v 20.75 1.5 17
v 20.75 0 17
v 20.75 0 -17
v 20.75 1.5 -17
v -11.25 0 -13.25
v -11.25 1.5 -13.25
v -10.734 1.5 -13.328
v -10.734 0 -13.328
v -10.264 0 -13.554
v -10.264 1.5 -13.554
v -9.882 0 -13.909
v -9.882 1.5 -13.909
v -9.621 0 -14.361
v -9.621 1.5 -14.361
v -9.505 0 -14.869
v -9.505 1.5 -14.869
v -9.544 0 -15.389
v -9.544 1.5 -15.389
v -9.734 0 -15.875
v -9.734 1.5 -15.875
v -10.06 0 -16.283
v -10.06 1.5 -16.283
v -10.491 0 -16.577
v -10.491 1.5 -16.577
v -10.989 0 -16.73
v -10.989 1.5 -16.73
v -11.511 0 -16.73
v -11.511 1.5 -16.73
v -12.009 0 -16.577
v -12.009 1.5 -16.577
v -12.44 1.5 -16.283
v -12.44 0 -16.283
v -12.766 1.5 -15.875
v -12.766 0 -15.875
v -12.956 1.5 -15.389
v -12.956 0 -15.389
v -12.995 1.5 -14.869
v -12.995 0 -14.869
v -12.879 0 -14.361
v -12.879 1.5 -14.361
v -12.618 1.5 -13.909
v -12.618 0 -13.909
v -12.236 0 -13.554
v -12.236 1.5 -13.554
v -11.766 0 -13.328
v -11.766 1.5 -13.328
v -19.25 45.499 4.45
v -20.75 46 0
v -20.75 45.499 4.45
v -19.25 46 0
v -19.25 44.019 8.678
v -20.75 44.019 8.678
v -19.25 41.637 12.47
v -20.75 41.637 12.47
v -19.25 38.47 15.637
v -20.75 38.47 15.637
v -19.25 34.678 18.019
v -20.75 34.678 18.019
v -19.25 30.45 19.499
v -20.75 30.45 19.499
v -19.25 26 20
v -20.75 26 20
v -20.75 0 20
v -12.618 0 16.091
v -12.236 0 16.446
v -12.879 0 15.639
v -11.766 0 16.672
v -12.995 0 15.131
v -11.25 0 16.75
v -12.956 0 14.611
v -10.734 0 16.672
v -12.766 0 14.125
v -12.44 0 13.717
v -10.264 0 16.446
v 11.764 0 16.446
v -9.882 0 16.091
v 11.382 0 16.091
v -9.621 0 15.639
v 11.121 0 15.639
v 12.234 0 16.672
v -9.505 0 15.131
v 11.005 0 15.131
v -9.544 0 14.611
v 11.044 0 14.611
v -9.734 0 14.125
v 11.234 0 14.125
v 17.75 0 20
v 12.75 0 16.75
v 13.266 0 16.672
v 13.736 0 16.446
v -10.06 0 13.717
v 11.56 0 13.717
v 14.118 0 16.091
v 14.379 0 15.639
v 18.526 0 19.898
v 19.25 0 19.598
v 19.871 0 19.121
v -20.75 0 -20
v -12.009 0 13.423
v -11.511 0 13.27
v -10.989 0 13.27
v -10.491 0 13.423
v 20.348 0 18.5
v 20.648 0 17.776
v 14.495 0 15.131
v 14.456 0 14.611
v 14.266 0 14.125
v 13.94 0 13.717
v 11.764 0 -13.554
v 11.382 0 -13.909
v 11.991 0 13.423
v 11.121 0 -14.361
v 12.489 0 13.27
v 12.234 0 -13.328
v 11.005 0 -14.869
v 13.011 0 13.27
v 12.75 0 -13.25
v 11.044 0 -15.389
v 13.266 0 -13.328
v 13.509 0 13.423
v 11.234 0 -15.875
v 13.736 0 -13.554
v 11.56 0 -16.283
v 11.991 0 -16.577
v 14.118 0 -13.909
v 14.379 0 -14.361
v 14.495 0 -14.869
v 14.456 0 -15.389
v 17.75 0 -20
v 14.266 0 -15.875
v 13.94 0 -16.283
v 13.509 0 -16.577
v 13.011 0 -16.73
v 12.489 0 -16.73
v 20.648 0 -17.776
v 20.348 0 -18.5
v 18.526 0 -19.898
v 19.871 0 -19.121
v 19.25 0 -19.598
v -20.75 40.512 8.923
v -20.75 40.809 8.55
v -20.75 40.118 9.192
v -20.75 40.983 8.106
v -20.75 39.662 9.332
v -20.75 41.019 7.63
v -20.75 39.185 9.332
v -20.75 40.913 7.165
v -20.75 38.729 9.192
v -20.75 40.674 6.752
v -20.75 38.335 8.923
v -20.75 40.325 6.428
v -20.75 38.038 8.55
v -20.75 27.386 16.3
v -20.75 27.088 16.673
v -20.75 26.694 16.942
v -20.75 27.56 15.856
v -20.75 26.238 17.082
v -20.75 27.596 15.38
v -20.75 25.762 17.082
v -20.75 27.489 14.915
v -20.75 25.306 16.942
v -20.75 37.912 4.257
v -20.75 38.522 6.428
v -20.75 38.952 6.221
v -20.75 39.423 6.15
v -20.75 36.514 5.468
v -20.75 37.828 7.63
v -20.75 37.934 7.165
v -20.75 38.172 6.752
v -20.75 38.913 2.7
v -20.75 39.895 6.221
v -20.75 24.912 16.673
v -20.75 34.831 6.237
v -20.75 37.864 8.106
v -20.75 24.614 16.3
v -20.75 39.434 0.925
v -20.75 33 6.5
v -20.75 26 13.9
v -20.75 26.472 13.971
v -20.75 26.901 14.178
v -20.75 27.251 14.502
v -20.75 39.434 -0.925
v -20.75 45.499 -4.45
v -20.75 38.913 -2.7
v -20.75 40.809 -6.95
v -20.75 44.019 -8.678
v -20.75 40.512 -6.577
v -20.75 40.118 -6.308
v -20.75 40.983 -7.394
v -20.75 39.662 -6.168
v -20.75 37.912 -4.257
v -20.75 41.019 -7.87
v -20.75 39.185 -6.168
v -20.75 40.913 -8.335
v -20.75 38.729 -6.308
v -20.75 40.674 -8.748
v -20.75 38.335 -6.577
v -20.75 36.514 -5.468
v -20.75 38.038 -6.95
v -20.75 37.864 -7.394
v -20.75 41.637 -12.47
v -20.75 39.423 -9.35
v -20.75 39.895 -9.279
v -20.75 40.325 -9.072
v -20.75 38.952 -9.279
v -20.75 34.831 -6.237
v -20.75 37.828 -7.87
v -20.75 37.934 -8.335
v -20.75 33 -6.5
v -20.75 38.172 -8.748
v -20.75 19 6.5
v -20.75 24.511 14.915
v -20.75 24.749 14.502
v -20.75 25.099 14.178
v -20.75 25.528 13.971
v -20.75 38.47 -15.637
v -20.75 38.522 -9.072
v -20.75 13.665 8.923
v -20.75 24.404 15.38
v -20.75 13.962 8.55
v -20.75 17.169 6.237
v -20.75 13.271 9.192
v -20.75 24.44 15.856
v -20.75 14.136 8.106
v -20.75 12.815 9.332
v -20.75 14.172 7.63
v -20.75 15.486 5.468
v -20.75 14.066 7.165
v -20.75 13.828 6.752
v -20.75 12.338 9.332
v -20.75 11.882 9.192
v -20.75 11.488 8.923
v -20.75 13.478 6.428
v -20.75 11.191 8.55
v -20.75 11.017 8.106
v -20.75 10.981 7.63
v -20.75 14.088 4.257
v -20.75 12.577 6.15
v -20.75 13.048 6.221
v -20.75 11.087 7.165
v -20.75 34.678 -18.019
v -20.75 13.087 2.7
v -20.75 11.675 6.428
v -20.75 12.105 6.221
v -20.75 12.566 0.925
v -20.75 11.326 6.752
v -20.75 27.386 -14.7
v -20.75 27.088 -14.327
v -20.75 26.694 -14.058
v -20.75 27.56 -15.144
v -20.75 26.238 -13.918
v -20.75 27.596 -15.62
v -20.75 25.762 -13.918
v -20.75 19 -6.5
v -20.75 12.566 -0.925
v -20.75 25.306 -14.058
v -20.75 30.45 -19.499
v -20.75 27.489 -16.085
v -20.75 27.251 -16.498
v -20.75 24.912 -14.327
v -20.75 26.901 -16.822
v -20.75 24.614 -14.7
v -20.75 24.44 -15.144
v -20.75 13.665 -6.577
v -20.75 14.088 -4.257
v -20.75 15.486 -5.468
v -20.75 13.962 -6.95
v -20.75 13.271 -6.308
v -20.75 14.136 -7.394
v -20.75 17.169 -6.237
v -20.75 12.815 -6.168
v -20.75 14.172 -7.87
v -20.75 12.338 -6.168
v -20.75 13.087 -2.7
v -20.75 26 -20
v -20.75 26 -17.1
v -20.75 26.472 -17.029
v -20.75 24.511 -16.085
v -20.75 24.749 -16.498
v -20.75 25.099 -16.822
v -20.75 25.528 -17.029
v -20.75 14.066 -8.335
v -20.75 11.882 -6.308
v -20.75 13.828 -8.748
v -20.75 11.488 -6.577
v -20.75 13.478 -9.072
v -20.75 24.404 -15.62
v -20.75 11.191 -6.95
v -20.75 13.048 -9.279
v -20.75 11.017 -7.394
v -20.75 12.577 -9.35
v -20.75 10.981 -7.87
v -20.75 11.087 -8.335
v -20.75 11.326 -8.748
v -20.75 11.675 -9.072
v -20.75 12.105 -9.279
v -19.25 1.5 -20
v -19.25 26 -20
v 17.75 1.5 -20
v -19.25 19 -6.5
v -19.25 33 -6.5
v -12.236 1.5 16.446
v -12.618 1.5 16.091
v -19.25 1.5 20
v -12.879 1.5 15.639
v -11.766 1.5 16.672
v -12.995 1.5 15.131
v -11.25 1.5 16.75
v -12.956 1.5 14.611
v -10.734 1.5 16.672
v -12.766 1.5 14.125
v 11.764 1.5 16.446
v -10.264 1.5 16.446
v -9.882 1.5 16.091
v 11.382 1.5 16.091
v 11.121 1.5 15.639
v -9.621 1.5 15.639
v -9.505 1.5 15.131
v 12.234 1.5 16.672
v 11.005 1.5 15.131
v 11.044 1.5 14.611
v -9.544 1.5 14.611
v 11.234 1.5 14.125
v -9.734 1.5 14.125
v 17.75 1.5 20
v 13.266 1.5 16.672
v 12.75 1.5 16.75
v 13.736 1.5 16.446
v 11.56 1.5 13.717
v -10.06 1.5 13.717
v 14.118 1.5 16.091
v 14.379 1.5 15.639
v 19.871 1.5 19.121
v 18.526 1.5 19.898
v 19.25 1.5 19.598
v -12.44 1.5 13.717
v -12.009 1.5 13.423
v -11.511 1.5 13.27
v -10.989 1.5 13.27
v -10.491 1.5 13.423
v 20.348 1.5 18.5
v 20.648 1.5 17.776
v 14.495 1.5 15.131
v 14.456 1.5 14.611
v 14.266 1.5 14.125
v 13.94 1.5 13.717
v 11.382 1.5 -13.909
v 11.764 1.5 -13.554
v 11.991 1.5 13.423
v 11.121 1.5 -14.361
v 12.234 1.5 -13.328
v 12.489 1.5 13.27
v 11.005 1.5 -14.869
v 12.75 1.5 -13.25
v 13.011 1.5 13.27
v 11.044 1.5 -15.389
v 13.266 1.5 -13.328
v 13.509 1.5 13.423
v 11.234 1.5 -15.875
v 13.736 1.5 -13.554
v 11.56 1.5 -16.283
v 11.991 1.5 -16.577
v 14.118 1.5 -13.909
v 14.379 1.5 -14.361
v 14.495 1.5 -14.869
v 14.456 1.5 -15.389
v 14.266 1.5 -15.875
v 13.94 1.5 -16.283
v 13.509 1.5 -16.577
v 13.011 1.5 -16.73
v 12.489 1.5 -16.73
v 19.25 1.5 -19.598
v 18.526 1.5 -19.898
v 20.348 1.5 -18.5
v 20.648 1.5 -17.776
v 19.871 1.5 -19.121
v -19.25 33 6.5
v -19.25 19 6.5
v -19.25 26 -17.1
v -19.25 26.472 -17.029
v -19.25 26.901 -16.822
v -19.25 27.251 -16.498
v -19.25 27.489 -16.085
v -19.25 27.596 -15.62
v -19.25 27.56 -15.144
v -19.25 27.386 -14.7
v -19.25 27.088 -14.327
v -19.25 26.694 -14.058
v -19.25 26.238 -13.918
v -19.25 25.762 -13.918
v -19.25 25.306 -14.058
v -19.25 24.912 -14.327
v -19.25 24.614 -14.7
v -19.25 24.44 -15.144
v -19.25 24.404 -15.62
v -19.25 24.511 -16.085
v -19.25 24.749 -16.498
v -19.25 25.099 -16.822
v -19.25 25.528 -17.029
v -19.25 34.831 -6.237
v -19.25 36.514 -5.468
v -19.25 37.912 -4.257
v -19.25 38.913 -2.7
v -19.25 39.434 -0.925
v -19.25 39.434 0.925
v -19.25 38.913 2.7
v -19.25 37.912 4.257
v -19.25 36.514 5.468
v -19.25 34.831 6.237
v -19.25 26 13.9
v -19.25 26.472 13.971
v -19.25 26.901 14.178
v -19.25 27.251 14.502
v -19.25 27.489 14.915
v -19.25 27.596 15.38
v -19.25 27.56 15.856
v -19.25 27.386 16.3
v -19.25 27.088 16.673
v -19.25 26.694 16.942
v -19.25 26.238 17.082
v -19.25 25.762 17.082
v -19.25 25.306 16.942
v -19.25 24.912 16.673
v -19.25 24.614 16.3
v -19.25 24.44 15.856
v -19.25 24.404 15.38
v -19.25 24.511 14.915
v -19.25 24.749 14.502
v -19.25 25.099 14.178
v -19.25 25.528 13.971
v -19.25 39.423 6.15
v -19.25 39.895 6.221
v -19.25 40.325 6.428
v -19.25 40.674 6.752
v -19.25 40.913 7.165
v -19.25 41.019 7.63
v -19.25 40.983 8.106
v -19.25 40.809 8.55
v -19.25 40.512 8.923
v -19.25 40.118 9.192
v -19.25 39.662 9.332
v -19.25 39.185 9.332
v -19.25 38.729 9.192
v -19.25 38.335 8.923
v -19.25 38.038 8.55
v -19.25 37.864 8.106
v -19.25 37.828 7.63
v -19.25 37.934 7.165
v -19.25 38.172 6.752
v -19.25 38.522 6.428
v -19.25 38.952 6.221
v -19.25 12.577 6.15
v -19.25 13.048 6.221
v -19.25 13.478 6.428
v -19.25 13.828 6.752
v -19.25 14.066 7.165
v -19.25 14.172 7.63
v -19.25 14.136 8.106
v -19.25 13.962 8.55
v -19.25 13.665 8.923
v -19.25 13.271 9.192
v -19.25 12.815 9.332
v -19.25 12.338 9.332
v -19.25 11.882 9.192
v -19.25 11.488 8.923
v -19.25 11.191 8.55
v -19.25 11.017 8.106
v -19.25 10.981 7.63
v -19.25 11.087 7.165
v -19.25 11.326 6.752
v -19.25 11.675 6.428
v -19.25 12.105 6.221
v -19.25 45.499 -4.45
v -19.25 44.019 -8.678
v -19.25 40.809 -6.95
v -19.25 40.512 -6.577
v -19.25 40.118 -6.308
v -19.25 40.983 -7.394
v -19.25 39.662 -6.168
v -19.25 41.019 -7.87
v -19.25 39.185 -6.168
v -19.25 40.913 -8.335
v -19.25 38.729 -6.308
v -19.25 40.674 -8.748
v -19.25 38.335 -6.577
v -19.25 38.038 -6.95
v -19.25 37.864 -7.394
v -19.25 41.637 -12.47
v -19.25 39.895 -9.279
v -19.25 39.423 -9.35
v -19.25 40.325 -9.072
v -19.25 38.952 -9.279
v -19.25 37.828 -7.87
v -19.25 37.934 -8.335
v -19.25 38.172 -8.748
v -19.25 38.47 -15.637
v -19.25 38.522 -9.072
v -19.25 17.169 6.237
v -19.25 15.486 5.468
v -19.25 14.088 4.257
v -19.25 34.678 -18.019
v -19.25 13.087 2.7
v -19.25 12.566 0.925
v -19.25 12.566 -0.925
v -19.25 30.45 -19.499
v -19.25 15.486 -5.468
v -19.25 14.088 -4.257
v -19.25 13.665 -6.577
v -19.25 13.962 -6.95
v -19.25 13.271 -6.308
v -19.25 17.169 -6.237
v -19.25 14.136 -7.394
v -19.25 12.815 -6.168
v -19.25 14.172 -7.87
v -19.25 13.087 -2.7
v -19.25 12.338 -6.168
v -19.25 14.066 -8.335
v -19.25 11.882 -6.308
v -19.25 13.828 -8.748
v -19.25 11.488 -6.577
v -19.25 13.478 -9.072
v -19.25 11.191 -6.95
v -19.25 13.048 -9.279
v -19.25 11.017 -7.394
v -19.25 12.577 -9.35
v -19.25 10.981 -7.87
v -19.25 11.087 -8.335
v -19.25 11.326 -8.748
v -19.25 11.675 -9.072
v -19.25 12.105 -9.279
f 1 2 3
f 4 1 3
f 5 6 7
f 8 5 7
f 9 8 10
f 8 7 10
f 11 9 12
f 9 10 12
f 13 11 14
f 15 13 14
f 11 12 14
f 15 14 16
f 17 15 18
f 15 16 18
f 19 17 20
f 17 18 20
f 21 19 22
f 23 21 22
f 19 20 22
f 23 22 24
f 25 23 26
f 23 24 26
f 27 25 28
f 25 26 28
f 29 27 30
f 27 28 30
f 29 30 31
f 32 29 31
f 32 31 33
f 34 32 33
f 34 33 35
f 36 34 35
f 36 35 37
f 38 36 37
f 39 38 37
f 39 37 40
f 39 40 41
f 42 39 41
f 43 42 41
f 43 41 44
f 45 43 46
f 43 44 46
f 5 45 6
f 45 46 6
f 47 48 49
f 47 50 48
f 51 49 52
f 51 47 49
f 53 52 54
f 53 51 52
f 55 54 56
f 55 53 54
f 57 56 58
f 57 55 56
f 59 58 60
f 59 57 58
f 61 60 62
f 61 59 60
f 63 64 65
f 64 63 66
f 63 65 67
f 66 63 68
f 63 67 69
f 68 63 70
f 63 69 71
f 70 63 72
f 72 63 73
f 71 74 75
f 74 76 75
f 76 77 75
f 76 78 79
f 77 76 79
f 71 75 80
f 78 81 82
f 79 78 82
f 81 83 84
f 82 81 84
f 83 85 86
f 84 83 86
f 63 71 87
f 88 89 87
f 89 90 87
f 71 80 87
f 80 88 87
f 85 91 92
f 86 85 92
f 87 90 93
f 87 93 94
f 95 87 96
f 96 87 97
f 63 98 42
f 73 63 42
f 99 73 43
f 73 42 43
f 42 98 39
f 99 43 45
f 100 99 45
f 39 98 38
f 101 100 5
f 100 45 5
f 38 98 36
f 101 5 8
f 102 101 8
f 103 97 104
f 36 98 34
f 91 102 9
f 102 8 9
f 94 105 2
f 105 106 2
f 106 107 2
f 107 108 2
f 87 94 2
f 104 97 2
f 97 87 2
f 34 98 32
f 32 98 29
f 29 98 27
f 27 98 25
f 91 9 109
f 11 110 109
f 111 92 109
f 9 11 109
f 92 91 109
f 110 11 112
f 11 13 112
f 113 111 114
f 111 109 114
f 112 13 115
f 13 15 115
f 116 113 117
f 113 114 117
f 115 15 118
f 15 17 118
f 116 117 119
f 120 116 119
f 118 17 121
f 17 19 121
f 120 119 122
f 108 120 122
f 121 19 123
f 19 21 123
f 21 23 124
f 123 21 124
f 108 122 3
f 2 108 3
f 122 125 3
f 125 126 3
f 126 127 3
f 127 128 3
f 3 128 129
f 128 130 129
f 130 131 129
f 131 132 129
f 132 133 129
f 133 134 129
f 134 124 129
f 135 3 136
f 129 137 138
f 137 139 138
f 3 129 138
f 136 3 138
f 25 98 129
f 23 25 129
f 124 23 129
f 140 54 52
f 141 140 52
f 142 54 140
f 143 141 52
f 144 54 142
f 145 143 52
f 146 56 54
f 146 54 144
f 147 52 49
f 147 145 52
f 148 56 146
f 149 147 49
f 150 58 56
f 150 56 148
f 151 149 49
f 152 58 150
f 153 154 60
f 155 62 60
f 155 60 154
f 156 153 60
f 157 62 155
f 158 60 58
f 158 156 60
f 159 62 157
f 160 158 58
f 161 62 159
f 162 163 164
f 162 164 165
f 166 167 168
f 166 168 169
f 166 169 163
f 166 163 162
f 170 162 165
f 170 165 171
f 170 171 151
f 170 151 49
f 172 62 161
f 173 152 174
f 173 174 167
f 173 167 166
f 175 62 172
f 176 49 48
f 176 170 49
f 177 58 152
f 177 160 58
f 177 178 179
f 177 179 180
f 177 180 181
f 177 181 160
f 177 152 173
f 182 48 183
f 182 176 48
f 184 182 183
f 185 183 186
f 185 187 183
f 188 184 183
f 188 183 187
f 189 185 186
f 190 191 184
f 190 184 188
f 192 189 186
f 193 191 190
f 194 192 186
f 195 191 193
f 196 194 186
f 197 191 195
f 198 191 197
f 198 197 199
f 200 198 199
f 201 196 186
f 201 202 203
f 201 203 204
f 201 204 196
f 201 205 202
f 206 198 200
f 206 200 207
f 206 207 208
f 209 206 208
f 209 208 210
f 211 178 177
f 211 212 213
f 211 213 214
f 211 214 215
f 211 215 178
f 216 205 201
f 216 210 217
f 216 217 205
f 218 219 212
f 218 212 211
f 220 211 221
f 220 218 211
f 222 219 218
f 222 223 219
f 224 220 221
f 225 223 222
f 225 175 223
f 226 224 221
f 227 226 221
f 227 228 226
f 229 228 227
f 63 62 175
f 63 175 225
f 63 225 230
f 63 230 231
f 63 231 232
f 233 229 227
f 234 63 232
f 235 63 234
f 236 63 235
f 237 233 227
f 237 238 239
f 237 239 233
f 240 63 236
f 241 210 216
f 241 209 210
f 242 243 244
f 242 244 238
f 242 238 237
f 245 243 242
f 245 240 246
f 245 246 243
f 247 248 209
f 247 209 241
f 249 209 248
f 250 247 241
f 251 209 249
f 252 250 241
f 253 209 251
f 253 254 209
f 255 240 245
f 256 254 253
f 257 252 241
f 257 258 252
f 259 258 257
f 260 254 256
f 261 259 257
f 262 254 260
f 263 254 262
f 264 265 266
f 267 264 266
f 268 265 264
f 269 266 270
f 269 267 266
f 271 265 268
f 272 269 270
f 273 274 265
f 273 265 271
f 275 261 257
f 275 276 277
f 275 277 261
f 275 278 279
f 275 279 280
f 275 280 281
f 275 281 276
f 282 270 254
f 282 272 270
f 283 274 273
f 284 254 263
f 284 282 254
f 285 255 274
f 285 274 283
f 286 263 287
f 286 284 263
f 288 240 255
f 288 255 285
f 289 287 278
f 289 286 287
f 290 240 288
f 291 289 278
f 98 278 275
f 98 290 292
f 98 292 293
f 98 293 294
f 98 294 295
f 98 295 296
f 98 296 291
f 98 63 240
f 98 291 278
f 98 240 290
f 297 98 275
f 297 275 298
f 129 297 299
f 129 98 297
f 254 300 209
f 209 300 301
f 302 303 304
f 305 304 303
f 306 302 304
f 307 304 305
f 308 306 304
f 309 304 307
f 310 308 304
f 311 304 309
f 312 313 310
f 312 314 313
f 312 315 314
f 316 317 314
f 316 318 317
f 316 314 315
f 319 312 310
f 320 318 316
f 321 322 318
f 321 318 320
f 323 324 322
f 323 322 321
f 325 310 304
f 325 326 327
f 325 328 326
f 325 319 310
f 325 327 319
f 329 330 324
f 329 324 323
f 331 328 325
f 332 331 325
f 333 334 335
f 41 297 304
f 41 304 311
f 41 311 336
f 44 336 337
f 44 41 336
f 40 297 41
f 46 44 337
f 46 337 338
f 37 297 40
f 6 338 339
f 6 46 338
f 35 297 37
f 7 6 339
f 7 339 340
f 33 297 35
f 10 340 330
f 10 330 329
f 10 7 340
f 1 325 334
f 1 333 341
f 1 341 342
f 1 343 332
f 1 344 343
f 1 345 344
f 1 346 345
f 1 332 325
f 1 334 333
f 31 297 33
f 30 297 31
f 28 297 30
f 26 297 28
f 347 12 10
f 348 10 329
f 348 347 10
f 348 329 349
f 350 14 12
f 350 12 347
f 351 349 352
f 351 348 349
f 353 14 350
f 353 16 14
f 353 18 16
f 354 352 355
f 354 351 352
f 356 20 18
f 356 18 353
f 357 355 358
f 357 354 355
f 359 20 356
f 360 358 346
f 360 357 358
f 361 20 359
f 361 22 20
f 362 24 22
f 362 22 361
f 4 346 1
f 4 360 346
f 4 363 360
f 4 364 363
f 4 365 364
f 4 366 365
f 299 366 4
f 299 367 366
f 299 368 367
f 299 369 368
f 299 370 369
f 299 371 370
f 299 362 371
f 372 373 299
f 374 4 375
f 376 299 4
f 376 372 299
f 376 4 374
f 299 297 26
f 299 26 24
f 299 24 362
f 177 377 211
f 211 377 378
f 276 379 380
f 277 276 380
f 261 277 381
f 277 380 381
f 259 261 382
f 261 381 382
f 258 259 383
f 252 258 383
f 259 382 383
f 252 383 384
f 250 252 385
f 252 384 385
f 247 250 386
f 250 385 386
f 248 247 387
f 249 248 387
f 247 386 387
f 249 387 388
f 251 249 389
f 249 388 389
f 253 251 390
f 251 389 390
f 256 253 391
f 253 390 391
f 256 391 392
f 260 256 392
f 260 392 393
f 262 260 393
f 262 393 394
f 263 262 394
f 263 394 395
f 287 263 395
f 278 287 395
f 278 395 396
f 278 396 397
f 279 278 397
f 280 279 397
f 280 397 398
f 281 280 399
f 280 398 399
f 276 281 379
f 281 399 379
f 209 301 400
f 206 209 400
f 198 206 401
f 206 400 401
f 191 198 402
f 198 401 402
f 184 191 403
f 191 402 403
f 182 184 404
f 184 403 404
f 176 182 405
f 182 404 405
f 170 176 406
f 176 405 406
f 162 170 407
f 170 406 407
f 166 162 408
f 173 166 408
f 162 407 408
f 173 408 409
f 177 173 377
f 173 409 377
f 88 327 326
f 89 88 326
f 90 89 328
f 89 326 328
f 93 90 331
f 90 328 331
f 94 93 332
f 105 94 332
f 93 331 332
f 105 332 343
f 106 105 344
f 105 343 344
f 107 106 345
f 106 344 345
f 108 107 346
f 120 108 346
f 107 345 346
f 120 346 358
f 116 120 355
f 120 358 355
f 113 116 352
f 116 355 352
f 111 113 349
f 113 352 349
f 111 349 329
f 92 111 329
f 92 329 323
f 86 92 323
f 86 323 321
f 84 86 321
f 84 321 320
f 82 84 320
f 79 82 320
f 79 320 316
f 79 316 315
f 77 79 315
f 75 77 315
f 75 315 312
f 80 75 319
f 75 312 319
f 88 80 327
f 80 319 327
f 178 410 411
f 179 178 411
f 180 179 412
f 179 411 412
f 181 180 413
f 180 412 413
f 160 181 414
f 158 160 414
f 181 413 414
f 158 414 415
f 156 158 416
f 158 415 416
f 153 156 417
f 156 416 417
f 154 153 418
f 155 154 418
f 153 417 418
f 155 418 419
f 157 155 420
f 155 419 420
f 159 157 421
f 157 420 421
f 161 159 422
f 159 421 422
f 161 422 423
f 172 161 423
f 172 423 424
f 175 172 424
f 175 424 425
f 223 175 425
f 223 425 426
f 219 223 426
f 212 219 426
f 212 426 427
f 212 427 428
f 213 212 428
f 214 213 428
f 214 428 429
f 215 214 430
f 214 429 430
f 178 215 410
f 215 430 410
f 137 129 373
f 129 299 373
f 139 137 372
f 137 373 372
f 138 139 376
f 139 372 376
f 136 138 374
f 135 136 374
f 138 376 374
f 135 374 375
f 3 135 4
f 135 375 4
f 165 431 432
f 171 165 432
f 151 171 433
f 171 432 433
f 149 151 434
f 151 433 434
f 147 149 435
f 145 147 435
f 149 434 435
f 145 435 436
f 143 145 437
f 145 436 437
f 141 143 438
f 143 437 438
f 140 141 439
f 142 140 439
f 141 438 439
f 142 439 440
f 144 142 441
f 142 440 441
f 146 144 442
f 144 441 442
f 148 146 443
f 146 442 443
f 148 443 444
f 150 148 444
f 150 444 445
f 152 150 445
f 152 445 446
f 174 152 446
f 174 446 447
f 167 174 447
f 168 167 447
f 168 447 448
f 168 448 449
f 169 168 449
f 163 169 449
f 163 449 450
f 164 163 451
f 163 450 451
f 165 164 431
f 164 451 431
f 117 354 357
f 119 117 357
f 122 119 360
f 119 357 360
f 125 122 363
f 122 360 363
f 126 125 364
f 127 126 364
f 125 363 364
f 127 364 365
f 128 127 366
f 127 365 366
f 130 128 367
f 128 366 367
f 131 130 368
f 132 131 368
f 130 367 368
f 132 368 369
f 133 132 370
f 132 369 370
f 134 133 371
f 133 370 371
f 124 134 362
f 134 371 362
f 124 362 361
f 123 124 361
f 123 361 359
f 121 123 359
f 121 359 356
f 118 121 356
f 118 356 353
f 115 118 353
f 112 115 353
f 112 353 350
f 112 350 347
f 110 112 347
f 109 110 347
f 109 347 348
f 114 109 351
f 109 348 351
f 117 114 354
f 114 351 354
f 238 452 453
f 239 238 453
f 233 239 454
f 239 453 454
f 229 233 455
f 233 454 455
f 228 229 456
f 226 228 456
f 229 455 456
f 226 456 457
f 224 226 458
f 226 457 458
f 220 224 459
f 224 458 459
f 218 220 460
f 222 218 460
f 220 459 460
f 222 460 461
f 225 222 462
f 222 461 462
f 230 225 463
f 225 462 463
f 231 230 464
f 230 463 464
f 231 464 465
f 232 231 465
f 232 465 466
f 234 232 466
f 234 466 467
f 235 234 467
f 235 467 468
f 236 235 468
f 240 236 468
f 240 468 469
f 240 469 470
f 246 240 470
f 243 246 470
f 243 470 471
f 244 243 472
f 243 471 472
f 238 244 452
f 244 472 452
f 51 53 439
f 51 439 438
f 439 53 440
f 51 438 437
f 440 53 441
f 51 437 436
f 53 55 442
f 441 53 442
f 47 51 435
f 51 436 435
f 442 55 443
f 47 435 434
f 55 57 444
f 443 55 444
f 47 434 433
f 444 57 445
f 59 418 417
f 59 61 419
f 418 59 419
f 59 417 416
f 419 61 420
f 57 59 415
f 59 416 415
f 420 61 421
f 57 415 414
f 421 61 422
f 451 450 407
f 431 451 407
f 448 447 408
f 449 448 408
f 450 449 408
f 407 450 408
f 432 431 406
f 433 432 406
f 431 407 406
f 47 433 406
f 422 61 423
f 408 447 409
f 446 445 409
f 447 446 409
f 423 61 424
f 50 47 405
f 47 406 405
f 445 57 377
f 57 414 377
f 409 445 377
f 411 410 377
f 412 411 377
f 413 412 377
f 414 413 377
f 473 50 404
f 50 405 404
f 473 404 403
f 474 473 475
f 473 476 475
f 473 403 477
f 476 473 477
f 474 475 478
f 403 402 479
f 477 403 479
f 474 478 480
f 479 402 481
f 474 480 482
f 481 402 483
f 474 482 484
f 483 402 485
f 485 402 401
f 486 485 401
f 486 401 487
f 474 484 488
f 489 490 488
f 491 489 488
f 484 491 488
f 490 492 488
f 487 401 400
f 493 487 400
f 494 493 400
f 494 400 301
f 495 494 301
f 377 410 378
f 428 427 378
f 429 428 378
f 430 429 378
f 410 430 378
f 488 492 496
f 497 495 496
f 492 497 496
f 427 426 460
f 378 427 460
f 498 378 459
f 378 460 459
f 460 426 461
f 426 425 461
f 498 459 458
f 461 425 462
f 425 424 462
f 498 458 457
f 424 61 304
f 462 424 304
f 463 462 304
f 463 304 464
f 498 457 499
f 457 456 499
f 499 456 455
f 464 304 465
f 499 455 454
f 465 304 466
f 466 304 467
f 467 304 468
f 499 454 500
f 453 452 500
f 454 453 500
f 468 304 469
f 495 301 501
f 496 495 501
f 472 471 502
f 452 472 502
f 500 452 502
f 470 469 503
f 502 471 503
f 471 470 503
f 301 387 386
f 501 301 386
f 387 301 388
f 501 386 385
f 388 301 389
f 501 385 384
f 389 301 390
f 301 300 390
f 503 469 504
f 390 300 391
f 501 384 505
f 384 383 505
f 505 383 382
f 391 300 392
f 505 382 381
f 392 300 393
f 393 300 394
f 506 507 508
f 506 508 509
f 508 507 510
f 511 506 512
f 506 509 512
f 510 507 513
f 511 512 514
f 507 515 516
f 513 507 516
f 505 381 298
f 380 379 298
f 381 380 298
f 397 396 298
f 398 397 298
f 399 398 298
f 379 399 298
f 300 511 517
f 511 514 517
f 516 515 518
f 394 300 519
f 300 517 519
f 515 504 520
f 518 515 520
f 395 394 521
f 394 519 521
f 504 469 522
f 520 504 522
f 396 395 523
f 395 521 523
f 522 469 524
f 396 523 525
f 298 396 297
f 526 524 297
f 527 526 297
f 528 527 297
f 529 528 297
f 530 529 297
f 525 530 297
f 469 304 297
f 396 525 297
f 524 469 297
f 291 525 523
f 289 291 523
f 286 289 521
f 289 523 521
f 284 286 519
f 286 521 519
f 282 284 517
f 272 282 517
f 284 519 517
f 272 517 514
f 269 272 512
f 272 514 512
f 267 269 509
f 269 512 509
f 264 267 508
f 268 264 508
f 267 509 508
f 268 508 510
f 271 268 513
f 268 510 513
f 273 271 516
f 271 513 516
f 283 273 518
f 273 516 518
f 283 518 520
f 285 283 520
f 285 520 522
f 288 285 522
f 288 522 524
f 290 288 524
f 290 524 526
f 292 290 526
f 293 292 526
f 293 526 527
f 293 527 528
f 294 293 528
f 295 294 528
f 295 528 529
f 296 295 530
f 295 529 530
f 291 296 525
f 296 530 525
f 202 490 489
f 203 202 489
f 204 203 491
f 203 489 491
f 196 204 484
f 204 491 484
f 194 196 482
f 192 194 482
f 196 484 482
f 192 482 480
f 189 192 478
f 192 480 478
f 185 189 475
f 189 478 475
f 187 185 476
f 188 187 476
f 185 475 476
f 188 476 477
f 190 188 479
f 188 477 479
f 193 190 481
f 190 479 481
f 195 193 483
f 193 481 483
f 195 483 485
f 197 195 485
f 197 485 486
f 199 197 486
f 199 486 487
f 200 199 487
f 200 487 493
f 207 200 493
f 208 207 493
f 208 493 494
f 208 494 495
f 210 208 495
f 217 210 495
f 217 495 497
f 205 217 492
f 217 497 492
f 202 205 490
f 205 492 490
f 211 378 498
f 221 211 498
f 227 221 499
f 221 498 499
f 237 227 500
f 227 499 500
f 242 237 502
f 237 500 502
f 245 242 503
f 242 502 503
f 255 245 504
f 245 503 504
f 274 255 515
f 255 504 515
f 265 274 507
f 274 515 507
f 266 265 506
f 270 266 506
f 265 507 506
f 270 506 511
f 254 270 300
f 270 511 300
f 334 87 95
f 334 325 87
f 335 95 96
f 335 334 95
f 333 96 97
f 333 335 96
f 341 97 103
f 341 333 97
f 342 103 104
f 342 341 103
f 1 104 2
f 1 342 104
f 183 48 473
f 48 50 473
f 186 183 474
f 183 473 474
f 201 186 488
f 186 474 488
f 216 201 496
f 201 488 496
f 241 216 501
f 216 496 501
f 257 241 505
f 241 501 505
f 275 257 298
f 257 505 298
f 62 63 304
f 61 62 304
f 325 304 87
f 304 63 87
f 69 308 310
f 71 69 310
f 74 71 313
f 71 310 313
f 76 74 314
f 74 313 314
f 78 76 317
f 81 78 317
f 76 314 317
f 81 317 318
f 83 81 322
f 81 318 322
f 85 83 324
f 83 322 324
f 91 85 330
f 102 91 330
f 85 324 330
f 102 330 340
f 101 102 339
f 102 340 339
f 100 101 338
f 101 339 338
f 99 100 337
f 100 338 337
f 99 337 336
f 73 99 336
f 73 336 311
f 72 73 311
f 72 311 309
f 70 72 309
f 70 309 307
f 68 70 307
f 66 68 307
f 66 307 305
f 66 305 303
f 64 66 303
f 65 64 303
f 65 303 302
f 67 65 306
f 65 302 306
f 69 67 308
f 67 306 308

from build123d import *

# Parameters (mm, degrees)
SKETCH_3_W          = 41.5
SKETCH_3_H          = 40
EXTRUDE_1_DEPTH     = 1.5
SKETCH_4_W          = 1.5
SKETCH_4_H          = 40
EXTRUDE_2_DEPTH     = 44.5
SKETCH_5_R          = 1.75
CUT_EXTRUDE_1_DEPTH = 1.5
SKETCH_6_R          = 1.6
CUT_EXTRUDE_2_DEPTH = 1.5
FILLET_3_R          = 20
FILLET_4_R          = 3


with BuildPart() as part:
    # 草图3 → 凸台-拉伸1 (new body)
    with BuildSketch(Plane(origin=(0, 0, 0), x_dir=(1, 0, 0), z_dir=(0, 1, 0))):
        Rectangle(SKETCH_3_W, SKETCH_3_H)
    extrude(amount=EXTRUDE_1_DEPTH)

    # 草图4 → 凸台-拉伸2 (add)
    with BuildSketch(Plane(origin=(0, 1.5, 0), x_dir=(1, 0, 0), z_dir=(0, 1, 0))):
        with Locations((-20, 0)):
            Rectangle(SKETCH_4_W, SKETCH_4_H)
    extrude(amount=EXTRUDE_2_DEPTH)

    # 草图5 → 切除-拉伸1 (cut)
    with BuildSketch(Plane(origin=(0, 1.5, 0), x_dir=(1, 0, 0), z_dir=(0, 1, 0))):
        with Locations(Location((-11.25, 15, 0), (0, 0, 270))):
            Circle(SKETCH_5_R)
        with Locations(Location((12.75, 15, 0), (0, 0, 270))):
            Circle(SKETCH_5_R)
        with Locations(Location((-11.25, -15, 0), (0, 0, 270))):
            Circle(SKETCH_5_R)
        with Locations(Location((12.75, -15, 0), (0, 0, 270))):
            Circle(SKETCH_5_R)
    extrude(amount=-CUT_EXTRUDE_1_DEPTH, mode=Mode.SUBTRACT)

    # 草图6 → 切除-拉伸2 (cut)
    with BuildSketch(Plane(origin=(-19.25, 0, 0), x_dir=(0, 0, -1), z_dir=(1, 0, 0))):
        with Locations((-15.5, 26)):
            Circle(SKETCH_6_R)
        with Locations((-7.75, 39.423393759)):
            Circle(SKETCH_6_R)
        with Locations((7.75, 39.423393759)):
            Circle(SKETCH_6_R)
        with Locations((15.5, 26)):
            Circle(SKETCH_6_R)
        with Locations((7.75, 12.576606241)):
            Circle(SKETCH_6_R)
        with Locations((-7.75, 12.576606241)):
            Circle(SKETCH_6_R)
        with BuildLine():
            Line((-6.5, 33), (-6.5, 19))
            ThreePointArc((-6.5, 19), (0, 12.5), (6.5, 19))
            Line((6.5, 19), (6.5, 33))
            ThreePointArc((6.5, 33), (0, 39.5), (-6.5, 33))
        make_face()
    extrude(amount=-CUT_EXTRUDE_2_DEPTH, mode=Mode.SUBTRACT)

    # 圆角3
    fillet_3_edges = [part.edges().sort_by_distance(p)[0] for p in [
        (-20, 46, -20),
        (-20, 46, 20),
    ]]
    fillet(fillet_3_edges, radius=FILLET_3_R - 0.0001)  # a hair under: the kernel refuses the full size

    # 圆角4
    fillet_4_edges = [part.edges().sort_by_distance(p)[0] for p in [
        (20.75, 0.75, 20),
        (20.75, 0.75, -20),
    ]]
    fillet(fillet_4_edges, radius=FILLET_4_R)


solid = part.part
